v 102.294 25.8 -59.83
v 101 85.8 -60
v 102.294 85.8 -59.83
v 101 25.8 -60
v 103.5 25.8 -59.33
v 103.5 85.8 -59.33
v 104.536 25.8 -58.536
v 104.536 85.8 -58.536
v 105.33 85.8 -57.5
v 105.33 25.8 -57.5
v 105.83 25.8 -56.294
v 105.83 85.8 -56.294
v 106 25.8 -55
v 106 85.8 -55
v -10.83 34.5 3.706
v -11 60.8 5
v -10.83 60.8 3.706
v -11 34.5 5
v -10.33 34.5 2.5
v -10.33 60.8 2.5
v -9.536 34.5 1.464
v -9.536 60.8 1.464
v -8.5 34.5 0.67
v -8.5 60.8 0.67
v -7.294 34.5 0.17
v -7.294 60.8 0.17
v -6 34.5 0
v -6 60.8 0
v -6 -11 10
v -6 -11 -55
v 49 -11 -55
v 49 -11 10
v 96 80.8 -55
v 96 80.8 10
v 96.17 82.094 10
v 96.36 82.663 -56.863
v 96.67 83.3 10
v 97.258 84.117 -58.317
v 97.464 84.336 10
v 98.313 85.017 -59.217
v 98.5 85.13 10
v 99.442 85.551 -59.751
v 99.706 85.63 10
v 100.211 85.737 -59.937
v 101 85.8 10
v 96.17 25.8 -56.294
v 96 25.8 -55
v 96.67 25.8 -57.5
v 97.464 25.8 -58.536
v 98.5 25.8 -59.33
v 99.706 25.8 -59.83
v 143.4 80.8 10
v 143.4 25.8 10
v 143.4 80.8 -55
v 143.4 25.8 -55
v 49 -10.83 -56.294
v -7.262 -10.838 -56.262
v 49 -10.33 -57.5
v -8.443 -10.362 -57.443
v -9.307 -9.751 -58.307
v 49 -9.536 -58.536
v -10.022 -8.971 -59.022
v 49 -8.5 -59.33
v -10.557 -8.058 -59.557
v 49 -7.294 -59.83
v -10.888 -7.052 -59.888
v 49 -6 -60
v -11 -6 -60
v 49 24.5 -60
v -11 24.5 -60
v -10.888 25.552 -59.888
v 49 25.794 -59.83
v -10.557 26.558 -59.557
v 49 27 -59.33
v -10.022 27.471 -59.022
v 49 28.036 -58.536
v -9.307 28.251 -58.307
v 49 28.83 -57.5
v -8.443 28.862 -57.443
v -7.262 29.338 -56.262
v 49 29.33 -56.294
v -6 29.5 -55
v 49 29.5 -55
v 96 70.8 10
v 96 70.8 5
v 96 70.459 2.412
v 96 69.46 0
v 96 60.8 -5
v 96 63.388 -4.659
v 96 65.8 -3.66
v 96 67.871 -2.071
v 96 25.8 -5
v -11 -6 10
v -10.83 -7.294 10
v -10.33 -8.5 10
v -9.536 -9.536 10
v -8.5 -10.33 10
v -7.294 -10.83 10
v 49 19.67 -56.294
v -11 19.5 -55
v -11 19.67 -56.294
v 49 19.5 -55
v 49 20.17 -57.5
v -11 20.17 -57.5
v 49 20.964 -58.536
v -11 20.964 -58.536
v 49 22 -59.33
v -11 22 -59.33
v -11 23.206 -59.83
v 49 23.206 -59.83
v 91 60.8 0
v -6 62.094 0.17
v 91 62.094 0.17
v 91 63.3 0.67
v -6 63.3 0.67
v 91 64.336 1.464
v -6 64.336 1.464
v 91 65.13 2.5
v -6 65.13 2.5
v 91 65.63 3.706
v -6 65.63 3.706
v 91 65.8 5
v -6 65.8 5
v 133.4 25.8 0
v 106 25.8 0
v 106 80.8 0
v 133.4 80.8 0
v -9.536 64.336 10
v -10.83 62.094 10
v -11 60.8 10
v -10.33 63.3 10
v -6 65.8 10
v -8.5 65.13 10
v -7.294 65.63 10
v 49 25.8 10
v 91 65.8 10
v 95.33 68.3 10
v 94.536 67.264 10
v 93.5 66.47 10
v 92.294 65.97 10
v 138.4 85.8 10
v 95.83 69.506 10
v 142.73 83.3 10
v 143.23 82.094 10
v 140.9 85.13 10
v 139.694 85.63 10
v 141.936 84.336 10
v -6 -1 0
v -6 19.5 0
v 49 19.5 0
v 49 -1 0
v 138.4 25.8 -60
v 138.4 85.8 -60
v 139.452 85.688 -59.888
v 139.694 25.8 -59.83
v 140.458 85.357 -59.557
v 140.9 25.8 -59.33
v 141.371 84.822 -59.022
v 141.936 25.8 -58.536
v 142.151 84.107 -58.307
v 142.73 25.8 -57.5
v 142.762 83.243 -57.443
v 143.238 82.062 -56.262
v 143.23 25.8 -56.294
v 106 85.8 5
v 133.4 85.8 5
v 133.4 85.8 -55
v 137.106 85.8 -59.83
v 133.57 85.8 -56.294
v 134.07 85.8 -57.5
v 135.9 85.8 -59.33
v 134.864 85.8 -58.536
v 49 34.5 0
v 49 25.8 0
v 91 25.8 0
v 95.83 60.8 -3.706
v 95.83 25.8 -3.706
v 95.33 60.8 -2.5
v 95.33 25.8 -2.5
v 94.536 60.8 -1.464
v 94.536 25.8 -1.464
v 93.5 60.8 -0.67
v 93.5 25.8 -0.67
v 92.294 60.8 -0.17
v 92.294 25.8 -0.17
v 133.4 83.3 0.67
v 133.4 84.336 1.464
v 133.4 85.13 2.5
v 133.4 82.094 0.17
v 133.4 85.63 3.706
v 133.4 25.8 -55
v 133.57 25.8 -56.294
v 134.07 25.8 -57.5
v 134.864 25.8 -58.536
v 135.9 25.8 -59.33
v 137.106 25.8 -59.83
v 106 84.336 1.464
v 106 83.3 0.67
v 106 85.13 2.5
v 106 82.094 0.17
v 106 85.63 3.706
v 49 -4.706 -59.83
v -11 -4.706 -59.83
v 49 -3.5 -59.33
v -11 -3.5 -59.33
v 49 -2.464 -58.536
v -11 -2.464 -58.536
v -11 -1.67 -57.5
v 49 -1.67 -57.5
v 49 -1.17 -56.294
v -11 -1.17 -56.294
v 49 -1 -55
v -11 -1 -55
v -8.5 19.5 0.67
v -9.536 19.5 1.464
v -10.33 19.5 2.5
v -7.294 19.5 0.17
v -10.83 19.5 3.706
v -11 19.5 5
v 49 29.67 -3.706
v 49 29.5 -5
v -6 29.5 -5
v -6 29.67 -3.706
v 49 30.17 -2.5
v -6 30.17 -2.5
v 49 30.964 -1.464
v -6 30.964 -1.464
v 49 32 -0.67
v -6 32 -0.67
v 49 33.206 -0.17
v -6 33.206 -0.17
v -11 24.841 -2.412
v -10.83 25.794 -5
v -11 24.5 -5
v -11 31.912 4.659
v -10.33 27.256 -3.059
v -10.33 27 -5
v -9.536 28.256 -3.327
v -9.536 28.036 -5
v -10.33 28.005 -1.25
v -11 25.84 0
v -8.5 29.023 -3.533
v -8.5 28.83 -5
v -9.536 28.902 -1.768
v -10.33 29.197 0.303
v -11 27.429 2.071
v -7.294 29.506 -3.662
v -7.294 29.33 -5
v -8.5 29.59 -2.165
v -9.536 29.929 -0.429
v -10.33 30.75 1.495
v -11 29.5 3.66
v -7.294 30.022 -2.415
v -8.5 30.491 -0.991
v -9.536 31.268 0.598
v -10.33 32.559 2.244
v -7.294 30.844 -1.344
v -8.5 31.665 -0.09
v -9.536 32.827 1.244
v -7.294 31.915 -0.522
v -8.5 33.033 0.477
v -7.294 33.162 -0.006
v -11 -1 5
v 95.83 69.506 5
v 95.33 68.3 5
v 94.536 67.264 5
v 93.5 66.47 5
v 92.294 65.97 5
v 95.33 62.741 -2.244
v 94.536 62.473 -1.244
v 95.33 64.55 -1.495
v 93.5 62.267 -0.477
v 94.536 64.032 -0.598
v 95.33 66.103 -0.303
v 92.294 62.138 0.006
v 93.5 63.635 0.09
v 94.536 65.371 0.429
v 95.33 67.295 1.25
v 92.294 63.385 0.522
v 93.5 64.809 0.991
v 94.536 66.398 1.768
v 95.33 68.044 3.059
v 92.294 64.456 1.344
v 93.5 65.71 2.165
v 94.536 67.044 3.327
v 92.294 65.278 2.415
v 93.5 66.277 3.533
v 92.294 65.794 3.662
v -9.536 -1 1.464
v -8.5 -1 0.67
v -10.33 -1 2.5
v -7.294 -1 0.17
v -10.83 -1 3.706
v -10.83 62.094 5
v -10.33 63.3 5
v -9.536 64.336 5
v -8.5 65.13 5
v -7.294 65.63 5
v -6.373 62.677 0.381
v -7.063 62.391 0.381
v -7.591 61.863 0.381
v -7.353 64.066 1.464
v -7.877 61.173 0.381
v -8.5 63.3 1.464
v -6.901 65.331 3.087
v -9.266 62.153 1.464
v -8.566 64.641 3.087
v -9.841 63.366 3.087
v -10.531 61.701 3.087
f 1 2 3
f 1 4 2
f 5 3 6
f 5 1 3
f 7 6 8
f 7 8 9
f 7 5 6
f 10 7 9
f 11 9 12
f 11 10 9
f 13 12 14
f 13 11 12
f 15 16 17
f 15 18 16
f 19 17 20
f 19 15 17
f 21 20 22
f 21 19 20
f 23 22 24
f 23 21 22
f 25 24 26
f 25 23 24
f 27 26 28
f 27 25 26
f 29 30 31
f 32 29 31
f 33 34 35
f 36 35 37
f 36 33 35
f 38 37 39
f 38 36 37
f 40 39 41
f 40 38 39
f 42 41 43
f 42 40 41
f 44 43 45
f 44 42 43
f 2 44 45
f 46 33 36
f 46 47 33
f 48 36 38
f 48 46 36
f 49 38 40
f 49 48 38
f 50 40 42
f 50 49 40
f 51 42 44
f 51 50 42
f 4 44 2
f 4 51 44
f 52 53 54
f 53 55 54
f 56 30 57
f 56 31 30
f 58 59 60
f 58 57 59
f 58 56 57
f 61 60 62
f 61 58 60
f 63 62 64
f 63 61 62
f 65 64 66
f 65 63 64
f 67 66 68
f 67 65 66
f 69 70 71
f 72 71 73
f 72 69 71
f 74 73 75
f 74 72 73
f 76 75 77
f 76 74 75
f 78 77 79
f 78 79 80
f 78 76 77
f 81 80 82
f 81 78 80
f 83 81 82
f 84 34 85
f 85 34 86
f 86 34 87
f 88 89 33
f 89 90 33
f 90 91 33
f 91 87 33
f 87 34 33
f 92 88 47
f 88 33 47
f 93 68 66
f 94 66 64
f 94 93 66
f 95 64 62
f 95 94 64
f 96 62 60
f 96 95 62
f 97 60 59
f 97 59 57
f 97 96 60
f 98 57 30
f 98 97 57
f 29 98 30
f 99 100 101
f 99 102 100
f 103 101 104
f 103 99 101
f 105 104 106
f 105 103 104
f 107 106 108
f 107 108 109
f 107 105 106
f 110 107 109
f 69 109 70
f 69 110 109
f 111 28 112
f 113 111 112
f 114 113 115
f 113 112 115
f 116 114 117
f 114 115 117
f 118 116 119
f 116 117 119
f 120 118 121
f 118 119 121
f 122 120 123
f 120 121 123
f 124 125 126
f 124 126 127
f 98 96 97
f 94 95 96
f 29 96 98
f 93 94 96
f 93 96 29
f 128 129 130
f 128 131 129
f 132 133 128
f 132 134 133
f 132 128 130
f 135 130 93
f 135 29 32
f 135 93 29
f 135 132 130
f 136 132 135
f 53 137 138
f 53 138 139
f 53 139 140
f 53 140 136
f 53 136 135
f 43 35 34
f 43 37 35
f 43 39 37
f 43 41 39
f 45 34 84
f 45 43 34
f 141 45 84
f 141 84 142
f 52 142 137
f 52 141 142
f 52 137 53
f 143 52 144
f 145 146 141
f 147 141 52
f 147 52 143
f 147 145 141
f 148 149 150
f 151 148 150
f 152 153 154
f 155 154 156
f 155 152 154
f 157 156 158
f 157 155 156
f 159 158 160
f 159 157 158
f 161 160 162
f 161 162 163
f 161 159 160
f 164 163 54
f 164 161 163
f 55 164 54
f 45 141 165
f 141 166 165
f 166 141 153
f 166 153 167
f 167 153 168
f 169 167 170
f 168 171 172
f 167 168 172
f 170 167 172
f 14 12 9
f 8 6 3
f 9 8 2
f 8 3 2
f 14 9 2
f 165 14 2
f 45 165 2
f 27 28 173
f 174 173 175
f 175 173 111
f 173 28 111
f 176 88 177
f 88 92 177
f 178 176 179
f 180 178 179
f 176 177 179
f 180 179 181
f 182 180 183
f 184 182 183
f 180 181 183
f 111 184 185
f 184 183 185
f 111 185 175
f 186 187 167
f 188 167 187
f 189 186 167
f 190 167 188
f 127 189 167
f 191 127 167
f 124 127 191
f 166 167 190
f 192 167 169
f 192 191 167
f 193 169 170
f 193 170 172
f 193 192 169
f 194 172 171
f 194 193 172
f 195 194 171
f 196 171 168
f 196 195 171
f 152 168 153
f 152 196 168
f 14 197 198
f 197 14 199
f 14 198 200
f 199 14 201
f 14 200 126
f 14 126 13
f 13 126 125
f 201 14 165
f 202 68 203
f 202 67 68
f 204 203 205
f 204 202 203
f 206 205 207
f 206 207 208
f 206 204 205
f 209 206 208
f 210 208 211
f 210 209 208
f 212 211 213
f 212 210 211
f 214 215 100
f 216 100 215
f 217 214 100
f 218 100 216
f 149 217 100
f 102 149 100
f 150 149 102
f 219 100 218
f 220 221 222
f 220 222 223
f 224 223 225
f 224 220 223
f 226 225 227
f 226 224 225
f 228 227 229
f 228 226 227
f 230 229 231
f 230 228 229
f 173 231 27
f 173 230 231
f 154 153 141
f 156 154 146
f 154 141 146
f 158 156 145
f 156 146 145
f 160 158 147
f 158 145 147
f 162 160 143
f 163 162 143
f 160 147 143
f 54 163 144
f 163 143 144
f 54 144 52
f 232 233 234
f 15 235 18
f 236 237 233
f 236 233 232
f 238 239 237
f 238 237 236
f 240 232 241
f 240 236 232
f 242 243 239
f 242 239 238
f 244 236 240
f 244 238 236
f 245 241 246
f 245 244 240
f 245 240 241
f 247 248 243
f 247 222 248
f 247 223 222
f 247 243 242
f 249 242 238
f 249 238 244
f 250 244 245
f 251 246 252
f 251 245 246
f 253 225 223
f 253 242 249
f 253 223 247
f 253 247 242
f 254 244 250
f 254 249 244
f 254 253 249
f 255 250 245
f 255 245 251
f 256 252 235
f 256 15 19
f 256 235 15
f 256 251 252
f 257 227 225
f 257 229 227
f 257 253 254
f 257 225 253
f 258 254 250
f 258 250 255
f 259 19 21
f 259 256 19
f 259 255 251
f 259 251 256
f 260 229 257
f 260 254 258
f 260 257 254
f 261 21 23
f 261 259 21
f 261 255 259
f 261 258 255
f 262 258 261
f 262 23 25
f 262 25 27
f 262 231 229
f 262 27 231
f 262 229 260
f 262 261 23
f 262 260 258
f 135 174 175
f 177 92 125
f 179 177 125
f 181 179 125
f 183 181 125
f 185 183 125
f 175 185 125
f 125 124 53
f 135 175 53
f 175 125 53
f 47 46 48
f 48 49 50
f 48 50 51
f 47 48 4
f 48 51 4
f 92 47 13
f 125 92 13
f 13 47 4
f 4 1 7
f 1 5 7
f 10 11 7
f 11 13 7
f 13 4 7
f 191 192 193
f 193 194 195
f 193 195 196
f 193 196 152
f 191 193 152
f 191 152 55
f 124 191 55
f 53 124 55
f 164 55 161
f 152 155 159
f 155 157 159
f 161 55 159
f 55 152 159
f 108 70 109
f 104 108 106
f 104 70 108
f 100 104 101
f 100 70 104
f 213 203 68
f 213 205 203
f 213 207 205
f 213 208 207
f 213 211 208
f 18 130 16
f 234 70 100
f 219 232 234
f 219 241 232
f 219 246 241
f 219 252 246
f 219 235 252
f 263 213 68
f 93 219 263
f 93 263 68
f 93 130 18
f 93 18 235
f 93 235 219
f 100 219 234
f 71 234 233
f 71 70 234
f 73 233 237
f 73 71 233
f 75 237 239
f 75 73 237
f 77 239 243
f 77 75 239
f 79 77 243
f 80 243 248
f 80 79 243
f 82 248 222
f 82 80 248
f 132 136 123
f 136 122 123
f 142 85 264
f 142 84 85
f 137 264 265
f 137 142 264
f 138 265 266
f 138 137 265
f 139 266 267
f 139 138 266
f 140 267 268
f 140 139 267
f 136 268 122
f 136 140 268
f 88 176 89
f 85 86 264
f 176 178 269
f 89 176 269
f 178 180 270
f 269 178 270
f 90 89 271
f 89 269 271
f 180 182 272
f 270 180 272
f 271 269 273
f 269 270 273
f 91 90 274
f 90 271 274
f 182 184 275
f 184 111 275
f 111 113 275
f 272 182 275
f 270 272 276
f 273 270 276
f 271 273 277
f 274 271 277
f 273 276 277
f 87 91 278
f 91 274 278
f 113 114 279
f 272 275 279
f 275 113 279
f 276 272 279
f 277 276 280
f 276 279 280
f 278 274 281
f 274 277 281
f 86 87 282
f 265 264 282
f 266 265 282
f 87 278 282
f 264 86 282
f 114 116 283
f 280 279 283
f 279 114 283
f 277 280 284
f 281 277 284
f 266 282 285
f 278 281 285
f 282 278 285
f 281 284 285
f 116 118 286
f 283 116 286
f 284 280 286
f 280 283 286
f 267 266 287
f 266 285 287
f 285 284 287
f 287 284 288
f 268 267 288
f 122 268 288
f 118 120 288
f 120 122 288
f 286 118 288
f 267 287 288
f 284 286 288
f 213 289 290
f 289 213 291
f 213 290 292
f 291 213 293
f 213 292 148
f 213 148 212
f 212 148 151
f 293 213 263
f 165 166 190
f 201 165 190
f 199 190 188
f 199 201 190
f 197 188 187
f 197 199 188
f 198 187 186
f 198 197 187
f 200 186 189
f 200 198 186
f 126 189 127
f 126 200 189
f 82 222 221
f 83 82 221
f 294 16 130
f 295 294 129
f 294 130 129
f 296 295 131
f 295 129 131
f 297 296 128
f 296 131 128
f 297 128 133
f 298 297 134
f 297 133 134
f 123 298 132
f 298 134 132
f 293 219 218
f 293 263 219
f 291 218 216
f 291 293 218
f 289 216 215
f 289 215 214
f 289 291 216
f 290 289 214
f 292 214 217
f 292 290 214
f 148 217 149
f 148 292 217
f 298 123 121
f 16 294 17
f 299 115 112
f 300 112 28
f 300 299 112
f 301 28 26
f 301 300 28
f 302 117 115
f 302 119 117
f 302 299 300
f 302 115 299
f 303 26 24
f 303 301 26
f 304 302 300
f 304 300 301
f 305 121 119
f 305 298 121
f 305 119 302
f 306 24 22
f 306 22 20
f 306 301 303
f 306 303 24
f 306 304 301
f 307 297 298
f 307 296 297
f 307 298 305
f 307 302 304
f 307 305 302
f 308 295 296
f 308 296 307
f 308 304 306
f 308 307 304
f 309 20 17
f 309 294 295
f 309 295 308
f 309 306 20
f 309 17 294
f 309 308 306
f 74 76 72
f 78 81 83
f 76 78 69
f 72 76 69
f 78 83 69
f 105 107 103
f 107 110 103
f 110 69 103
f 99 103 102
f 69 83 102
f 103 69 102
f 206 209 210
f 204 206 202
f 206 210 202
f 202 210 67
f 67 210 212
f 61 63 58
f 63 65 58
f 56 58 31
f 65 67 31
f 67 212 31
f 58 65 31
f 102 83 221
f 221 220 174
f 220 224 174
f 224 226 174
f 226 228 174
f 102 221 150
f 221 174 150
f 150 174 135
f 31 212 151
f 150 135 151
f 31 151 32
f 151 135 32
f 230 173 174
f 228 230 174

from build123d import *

# Parameters (mm, degrees)
F2_DEPTH = 10
F3_W     = 60
F3_H     = 10
F3_W_2   = 10
F3_H_2   = 60
F4_DEPTH = 60
F5_R     = 4.99999


# Not quite as in the source:
# - a fillet or chamfer is up to 0.001 mm smaller than in the source, because OpenCascade refuses the exact size


with BuildPart() as f2:
    # F1 (on Top) → F2 (new body)
    with BuildSketch(Plane.XY):
        Polygon((-11, 65.8), (-11, -11), (49, -11), (49, 25.8), (143.4, 25.8), (143.4, 85.8), (96, 85.8), (96, 65.8), align=None)
    extrude(amount=F2_DEPTH)

    # F3 (on face) → F4 (join)
    with BuildSketch(Plane(origin=(0, 0, 0), x_dir=(1, 0, 0), z_dir=(0, 0, -1))):
        with Locations((19, 6)):
            Rectangle(F3_W, F3_H)
        with Locations((19, -24.5)):
            Rectangle(F3_W, F3_H)
        with Locations((101, -55.8)):
            Rectangle(F3_W_2, F3_H_2)
        with Locations((138.4, -55.8)):
            Rectangle(F3_W_2, F3_H_2)
    extrude(amount=F4_DEPTH)

    # F5 (radius 5 in the source; OpenCascade refuses exactly that, so slightly less here)
    f5_edges = [f2.edges().sort_by_distance(p)[0] for p in [
        (96, 65.8, 5),
        (96, 85.8, -25),
        (143.4, 85.8, -25),
        (-11, 65.8, 5),
        (-11, 29.5, -30),
        (-11, -11, -25),
        (119.7, 85.8, 0),
        (42.5, 65.8, 0),
        (-11, 47.65, 0),
        (-11, 9.25, 0),
        (133.4, 55.8, -60),
        (106, 55.8, -60),
        (96, 55.8, -60),
        (143.4, 55.8, -60),
        (19, 29.5, 0),
        (19, 29.5, -60),
        (19, -11, -60),
        (19, -1, -60),
        (19, 19.5, -60),
        (96, 45.8, 0),
    ]]
    fillet(f5_edges, radius=F5_R)


solid = f2.part
